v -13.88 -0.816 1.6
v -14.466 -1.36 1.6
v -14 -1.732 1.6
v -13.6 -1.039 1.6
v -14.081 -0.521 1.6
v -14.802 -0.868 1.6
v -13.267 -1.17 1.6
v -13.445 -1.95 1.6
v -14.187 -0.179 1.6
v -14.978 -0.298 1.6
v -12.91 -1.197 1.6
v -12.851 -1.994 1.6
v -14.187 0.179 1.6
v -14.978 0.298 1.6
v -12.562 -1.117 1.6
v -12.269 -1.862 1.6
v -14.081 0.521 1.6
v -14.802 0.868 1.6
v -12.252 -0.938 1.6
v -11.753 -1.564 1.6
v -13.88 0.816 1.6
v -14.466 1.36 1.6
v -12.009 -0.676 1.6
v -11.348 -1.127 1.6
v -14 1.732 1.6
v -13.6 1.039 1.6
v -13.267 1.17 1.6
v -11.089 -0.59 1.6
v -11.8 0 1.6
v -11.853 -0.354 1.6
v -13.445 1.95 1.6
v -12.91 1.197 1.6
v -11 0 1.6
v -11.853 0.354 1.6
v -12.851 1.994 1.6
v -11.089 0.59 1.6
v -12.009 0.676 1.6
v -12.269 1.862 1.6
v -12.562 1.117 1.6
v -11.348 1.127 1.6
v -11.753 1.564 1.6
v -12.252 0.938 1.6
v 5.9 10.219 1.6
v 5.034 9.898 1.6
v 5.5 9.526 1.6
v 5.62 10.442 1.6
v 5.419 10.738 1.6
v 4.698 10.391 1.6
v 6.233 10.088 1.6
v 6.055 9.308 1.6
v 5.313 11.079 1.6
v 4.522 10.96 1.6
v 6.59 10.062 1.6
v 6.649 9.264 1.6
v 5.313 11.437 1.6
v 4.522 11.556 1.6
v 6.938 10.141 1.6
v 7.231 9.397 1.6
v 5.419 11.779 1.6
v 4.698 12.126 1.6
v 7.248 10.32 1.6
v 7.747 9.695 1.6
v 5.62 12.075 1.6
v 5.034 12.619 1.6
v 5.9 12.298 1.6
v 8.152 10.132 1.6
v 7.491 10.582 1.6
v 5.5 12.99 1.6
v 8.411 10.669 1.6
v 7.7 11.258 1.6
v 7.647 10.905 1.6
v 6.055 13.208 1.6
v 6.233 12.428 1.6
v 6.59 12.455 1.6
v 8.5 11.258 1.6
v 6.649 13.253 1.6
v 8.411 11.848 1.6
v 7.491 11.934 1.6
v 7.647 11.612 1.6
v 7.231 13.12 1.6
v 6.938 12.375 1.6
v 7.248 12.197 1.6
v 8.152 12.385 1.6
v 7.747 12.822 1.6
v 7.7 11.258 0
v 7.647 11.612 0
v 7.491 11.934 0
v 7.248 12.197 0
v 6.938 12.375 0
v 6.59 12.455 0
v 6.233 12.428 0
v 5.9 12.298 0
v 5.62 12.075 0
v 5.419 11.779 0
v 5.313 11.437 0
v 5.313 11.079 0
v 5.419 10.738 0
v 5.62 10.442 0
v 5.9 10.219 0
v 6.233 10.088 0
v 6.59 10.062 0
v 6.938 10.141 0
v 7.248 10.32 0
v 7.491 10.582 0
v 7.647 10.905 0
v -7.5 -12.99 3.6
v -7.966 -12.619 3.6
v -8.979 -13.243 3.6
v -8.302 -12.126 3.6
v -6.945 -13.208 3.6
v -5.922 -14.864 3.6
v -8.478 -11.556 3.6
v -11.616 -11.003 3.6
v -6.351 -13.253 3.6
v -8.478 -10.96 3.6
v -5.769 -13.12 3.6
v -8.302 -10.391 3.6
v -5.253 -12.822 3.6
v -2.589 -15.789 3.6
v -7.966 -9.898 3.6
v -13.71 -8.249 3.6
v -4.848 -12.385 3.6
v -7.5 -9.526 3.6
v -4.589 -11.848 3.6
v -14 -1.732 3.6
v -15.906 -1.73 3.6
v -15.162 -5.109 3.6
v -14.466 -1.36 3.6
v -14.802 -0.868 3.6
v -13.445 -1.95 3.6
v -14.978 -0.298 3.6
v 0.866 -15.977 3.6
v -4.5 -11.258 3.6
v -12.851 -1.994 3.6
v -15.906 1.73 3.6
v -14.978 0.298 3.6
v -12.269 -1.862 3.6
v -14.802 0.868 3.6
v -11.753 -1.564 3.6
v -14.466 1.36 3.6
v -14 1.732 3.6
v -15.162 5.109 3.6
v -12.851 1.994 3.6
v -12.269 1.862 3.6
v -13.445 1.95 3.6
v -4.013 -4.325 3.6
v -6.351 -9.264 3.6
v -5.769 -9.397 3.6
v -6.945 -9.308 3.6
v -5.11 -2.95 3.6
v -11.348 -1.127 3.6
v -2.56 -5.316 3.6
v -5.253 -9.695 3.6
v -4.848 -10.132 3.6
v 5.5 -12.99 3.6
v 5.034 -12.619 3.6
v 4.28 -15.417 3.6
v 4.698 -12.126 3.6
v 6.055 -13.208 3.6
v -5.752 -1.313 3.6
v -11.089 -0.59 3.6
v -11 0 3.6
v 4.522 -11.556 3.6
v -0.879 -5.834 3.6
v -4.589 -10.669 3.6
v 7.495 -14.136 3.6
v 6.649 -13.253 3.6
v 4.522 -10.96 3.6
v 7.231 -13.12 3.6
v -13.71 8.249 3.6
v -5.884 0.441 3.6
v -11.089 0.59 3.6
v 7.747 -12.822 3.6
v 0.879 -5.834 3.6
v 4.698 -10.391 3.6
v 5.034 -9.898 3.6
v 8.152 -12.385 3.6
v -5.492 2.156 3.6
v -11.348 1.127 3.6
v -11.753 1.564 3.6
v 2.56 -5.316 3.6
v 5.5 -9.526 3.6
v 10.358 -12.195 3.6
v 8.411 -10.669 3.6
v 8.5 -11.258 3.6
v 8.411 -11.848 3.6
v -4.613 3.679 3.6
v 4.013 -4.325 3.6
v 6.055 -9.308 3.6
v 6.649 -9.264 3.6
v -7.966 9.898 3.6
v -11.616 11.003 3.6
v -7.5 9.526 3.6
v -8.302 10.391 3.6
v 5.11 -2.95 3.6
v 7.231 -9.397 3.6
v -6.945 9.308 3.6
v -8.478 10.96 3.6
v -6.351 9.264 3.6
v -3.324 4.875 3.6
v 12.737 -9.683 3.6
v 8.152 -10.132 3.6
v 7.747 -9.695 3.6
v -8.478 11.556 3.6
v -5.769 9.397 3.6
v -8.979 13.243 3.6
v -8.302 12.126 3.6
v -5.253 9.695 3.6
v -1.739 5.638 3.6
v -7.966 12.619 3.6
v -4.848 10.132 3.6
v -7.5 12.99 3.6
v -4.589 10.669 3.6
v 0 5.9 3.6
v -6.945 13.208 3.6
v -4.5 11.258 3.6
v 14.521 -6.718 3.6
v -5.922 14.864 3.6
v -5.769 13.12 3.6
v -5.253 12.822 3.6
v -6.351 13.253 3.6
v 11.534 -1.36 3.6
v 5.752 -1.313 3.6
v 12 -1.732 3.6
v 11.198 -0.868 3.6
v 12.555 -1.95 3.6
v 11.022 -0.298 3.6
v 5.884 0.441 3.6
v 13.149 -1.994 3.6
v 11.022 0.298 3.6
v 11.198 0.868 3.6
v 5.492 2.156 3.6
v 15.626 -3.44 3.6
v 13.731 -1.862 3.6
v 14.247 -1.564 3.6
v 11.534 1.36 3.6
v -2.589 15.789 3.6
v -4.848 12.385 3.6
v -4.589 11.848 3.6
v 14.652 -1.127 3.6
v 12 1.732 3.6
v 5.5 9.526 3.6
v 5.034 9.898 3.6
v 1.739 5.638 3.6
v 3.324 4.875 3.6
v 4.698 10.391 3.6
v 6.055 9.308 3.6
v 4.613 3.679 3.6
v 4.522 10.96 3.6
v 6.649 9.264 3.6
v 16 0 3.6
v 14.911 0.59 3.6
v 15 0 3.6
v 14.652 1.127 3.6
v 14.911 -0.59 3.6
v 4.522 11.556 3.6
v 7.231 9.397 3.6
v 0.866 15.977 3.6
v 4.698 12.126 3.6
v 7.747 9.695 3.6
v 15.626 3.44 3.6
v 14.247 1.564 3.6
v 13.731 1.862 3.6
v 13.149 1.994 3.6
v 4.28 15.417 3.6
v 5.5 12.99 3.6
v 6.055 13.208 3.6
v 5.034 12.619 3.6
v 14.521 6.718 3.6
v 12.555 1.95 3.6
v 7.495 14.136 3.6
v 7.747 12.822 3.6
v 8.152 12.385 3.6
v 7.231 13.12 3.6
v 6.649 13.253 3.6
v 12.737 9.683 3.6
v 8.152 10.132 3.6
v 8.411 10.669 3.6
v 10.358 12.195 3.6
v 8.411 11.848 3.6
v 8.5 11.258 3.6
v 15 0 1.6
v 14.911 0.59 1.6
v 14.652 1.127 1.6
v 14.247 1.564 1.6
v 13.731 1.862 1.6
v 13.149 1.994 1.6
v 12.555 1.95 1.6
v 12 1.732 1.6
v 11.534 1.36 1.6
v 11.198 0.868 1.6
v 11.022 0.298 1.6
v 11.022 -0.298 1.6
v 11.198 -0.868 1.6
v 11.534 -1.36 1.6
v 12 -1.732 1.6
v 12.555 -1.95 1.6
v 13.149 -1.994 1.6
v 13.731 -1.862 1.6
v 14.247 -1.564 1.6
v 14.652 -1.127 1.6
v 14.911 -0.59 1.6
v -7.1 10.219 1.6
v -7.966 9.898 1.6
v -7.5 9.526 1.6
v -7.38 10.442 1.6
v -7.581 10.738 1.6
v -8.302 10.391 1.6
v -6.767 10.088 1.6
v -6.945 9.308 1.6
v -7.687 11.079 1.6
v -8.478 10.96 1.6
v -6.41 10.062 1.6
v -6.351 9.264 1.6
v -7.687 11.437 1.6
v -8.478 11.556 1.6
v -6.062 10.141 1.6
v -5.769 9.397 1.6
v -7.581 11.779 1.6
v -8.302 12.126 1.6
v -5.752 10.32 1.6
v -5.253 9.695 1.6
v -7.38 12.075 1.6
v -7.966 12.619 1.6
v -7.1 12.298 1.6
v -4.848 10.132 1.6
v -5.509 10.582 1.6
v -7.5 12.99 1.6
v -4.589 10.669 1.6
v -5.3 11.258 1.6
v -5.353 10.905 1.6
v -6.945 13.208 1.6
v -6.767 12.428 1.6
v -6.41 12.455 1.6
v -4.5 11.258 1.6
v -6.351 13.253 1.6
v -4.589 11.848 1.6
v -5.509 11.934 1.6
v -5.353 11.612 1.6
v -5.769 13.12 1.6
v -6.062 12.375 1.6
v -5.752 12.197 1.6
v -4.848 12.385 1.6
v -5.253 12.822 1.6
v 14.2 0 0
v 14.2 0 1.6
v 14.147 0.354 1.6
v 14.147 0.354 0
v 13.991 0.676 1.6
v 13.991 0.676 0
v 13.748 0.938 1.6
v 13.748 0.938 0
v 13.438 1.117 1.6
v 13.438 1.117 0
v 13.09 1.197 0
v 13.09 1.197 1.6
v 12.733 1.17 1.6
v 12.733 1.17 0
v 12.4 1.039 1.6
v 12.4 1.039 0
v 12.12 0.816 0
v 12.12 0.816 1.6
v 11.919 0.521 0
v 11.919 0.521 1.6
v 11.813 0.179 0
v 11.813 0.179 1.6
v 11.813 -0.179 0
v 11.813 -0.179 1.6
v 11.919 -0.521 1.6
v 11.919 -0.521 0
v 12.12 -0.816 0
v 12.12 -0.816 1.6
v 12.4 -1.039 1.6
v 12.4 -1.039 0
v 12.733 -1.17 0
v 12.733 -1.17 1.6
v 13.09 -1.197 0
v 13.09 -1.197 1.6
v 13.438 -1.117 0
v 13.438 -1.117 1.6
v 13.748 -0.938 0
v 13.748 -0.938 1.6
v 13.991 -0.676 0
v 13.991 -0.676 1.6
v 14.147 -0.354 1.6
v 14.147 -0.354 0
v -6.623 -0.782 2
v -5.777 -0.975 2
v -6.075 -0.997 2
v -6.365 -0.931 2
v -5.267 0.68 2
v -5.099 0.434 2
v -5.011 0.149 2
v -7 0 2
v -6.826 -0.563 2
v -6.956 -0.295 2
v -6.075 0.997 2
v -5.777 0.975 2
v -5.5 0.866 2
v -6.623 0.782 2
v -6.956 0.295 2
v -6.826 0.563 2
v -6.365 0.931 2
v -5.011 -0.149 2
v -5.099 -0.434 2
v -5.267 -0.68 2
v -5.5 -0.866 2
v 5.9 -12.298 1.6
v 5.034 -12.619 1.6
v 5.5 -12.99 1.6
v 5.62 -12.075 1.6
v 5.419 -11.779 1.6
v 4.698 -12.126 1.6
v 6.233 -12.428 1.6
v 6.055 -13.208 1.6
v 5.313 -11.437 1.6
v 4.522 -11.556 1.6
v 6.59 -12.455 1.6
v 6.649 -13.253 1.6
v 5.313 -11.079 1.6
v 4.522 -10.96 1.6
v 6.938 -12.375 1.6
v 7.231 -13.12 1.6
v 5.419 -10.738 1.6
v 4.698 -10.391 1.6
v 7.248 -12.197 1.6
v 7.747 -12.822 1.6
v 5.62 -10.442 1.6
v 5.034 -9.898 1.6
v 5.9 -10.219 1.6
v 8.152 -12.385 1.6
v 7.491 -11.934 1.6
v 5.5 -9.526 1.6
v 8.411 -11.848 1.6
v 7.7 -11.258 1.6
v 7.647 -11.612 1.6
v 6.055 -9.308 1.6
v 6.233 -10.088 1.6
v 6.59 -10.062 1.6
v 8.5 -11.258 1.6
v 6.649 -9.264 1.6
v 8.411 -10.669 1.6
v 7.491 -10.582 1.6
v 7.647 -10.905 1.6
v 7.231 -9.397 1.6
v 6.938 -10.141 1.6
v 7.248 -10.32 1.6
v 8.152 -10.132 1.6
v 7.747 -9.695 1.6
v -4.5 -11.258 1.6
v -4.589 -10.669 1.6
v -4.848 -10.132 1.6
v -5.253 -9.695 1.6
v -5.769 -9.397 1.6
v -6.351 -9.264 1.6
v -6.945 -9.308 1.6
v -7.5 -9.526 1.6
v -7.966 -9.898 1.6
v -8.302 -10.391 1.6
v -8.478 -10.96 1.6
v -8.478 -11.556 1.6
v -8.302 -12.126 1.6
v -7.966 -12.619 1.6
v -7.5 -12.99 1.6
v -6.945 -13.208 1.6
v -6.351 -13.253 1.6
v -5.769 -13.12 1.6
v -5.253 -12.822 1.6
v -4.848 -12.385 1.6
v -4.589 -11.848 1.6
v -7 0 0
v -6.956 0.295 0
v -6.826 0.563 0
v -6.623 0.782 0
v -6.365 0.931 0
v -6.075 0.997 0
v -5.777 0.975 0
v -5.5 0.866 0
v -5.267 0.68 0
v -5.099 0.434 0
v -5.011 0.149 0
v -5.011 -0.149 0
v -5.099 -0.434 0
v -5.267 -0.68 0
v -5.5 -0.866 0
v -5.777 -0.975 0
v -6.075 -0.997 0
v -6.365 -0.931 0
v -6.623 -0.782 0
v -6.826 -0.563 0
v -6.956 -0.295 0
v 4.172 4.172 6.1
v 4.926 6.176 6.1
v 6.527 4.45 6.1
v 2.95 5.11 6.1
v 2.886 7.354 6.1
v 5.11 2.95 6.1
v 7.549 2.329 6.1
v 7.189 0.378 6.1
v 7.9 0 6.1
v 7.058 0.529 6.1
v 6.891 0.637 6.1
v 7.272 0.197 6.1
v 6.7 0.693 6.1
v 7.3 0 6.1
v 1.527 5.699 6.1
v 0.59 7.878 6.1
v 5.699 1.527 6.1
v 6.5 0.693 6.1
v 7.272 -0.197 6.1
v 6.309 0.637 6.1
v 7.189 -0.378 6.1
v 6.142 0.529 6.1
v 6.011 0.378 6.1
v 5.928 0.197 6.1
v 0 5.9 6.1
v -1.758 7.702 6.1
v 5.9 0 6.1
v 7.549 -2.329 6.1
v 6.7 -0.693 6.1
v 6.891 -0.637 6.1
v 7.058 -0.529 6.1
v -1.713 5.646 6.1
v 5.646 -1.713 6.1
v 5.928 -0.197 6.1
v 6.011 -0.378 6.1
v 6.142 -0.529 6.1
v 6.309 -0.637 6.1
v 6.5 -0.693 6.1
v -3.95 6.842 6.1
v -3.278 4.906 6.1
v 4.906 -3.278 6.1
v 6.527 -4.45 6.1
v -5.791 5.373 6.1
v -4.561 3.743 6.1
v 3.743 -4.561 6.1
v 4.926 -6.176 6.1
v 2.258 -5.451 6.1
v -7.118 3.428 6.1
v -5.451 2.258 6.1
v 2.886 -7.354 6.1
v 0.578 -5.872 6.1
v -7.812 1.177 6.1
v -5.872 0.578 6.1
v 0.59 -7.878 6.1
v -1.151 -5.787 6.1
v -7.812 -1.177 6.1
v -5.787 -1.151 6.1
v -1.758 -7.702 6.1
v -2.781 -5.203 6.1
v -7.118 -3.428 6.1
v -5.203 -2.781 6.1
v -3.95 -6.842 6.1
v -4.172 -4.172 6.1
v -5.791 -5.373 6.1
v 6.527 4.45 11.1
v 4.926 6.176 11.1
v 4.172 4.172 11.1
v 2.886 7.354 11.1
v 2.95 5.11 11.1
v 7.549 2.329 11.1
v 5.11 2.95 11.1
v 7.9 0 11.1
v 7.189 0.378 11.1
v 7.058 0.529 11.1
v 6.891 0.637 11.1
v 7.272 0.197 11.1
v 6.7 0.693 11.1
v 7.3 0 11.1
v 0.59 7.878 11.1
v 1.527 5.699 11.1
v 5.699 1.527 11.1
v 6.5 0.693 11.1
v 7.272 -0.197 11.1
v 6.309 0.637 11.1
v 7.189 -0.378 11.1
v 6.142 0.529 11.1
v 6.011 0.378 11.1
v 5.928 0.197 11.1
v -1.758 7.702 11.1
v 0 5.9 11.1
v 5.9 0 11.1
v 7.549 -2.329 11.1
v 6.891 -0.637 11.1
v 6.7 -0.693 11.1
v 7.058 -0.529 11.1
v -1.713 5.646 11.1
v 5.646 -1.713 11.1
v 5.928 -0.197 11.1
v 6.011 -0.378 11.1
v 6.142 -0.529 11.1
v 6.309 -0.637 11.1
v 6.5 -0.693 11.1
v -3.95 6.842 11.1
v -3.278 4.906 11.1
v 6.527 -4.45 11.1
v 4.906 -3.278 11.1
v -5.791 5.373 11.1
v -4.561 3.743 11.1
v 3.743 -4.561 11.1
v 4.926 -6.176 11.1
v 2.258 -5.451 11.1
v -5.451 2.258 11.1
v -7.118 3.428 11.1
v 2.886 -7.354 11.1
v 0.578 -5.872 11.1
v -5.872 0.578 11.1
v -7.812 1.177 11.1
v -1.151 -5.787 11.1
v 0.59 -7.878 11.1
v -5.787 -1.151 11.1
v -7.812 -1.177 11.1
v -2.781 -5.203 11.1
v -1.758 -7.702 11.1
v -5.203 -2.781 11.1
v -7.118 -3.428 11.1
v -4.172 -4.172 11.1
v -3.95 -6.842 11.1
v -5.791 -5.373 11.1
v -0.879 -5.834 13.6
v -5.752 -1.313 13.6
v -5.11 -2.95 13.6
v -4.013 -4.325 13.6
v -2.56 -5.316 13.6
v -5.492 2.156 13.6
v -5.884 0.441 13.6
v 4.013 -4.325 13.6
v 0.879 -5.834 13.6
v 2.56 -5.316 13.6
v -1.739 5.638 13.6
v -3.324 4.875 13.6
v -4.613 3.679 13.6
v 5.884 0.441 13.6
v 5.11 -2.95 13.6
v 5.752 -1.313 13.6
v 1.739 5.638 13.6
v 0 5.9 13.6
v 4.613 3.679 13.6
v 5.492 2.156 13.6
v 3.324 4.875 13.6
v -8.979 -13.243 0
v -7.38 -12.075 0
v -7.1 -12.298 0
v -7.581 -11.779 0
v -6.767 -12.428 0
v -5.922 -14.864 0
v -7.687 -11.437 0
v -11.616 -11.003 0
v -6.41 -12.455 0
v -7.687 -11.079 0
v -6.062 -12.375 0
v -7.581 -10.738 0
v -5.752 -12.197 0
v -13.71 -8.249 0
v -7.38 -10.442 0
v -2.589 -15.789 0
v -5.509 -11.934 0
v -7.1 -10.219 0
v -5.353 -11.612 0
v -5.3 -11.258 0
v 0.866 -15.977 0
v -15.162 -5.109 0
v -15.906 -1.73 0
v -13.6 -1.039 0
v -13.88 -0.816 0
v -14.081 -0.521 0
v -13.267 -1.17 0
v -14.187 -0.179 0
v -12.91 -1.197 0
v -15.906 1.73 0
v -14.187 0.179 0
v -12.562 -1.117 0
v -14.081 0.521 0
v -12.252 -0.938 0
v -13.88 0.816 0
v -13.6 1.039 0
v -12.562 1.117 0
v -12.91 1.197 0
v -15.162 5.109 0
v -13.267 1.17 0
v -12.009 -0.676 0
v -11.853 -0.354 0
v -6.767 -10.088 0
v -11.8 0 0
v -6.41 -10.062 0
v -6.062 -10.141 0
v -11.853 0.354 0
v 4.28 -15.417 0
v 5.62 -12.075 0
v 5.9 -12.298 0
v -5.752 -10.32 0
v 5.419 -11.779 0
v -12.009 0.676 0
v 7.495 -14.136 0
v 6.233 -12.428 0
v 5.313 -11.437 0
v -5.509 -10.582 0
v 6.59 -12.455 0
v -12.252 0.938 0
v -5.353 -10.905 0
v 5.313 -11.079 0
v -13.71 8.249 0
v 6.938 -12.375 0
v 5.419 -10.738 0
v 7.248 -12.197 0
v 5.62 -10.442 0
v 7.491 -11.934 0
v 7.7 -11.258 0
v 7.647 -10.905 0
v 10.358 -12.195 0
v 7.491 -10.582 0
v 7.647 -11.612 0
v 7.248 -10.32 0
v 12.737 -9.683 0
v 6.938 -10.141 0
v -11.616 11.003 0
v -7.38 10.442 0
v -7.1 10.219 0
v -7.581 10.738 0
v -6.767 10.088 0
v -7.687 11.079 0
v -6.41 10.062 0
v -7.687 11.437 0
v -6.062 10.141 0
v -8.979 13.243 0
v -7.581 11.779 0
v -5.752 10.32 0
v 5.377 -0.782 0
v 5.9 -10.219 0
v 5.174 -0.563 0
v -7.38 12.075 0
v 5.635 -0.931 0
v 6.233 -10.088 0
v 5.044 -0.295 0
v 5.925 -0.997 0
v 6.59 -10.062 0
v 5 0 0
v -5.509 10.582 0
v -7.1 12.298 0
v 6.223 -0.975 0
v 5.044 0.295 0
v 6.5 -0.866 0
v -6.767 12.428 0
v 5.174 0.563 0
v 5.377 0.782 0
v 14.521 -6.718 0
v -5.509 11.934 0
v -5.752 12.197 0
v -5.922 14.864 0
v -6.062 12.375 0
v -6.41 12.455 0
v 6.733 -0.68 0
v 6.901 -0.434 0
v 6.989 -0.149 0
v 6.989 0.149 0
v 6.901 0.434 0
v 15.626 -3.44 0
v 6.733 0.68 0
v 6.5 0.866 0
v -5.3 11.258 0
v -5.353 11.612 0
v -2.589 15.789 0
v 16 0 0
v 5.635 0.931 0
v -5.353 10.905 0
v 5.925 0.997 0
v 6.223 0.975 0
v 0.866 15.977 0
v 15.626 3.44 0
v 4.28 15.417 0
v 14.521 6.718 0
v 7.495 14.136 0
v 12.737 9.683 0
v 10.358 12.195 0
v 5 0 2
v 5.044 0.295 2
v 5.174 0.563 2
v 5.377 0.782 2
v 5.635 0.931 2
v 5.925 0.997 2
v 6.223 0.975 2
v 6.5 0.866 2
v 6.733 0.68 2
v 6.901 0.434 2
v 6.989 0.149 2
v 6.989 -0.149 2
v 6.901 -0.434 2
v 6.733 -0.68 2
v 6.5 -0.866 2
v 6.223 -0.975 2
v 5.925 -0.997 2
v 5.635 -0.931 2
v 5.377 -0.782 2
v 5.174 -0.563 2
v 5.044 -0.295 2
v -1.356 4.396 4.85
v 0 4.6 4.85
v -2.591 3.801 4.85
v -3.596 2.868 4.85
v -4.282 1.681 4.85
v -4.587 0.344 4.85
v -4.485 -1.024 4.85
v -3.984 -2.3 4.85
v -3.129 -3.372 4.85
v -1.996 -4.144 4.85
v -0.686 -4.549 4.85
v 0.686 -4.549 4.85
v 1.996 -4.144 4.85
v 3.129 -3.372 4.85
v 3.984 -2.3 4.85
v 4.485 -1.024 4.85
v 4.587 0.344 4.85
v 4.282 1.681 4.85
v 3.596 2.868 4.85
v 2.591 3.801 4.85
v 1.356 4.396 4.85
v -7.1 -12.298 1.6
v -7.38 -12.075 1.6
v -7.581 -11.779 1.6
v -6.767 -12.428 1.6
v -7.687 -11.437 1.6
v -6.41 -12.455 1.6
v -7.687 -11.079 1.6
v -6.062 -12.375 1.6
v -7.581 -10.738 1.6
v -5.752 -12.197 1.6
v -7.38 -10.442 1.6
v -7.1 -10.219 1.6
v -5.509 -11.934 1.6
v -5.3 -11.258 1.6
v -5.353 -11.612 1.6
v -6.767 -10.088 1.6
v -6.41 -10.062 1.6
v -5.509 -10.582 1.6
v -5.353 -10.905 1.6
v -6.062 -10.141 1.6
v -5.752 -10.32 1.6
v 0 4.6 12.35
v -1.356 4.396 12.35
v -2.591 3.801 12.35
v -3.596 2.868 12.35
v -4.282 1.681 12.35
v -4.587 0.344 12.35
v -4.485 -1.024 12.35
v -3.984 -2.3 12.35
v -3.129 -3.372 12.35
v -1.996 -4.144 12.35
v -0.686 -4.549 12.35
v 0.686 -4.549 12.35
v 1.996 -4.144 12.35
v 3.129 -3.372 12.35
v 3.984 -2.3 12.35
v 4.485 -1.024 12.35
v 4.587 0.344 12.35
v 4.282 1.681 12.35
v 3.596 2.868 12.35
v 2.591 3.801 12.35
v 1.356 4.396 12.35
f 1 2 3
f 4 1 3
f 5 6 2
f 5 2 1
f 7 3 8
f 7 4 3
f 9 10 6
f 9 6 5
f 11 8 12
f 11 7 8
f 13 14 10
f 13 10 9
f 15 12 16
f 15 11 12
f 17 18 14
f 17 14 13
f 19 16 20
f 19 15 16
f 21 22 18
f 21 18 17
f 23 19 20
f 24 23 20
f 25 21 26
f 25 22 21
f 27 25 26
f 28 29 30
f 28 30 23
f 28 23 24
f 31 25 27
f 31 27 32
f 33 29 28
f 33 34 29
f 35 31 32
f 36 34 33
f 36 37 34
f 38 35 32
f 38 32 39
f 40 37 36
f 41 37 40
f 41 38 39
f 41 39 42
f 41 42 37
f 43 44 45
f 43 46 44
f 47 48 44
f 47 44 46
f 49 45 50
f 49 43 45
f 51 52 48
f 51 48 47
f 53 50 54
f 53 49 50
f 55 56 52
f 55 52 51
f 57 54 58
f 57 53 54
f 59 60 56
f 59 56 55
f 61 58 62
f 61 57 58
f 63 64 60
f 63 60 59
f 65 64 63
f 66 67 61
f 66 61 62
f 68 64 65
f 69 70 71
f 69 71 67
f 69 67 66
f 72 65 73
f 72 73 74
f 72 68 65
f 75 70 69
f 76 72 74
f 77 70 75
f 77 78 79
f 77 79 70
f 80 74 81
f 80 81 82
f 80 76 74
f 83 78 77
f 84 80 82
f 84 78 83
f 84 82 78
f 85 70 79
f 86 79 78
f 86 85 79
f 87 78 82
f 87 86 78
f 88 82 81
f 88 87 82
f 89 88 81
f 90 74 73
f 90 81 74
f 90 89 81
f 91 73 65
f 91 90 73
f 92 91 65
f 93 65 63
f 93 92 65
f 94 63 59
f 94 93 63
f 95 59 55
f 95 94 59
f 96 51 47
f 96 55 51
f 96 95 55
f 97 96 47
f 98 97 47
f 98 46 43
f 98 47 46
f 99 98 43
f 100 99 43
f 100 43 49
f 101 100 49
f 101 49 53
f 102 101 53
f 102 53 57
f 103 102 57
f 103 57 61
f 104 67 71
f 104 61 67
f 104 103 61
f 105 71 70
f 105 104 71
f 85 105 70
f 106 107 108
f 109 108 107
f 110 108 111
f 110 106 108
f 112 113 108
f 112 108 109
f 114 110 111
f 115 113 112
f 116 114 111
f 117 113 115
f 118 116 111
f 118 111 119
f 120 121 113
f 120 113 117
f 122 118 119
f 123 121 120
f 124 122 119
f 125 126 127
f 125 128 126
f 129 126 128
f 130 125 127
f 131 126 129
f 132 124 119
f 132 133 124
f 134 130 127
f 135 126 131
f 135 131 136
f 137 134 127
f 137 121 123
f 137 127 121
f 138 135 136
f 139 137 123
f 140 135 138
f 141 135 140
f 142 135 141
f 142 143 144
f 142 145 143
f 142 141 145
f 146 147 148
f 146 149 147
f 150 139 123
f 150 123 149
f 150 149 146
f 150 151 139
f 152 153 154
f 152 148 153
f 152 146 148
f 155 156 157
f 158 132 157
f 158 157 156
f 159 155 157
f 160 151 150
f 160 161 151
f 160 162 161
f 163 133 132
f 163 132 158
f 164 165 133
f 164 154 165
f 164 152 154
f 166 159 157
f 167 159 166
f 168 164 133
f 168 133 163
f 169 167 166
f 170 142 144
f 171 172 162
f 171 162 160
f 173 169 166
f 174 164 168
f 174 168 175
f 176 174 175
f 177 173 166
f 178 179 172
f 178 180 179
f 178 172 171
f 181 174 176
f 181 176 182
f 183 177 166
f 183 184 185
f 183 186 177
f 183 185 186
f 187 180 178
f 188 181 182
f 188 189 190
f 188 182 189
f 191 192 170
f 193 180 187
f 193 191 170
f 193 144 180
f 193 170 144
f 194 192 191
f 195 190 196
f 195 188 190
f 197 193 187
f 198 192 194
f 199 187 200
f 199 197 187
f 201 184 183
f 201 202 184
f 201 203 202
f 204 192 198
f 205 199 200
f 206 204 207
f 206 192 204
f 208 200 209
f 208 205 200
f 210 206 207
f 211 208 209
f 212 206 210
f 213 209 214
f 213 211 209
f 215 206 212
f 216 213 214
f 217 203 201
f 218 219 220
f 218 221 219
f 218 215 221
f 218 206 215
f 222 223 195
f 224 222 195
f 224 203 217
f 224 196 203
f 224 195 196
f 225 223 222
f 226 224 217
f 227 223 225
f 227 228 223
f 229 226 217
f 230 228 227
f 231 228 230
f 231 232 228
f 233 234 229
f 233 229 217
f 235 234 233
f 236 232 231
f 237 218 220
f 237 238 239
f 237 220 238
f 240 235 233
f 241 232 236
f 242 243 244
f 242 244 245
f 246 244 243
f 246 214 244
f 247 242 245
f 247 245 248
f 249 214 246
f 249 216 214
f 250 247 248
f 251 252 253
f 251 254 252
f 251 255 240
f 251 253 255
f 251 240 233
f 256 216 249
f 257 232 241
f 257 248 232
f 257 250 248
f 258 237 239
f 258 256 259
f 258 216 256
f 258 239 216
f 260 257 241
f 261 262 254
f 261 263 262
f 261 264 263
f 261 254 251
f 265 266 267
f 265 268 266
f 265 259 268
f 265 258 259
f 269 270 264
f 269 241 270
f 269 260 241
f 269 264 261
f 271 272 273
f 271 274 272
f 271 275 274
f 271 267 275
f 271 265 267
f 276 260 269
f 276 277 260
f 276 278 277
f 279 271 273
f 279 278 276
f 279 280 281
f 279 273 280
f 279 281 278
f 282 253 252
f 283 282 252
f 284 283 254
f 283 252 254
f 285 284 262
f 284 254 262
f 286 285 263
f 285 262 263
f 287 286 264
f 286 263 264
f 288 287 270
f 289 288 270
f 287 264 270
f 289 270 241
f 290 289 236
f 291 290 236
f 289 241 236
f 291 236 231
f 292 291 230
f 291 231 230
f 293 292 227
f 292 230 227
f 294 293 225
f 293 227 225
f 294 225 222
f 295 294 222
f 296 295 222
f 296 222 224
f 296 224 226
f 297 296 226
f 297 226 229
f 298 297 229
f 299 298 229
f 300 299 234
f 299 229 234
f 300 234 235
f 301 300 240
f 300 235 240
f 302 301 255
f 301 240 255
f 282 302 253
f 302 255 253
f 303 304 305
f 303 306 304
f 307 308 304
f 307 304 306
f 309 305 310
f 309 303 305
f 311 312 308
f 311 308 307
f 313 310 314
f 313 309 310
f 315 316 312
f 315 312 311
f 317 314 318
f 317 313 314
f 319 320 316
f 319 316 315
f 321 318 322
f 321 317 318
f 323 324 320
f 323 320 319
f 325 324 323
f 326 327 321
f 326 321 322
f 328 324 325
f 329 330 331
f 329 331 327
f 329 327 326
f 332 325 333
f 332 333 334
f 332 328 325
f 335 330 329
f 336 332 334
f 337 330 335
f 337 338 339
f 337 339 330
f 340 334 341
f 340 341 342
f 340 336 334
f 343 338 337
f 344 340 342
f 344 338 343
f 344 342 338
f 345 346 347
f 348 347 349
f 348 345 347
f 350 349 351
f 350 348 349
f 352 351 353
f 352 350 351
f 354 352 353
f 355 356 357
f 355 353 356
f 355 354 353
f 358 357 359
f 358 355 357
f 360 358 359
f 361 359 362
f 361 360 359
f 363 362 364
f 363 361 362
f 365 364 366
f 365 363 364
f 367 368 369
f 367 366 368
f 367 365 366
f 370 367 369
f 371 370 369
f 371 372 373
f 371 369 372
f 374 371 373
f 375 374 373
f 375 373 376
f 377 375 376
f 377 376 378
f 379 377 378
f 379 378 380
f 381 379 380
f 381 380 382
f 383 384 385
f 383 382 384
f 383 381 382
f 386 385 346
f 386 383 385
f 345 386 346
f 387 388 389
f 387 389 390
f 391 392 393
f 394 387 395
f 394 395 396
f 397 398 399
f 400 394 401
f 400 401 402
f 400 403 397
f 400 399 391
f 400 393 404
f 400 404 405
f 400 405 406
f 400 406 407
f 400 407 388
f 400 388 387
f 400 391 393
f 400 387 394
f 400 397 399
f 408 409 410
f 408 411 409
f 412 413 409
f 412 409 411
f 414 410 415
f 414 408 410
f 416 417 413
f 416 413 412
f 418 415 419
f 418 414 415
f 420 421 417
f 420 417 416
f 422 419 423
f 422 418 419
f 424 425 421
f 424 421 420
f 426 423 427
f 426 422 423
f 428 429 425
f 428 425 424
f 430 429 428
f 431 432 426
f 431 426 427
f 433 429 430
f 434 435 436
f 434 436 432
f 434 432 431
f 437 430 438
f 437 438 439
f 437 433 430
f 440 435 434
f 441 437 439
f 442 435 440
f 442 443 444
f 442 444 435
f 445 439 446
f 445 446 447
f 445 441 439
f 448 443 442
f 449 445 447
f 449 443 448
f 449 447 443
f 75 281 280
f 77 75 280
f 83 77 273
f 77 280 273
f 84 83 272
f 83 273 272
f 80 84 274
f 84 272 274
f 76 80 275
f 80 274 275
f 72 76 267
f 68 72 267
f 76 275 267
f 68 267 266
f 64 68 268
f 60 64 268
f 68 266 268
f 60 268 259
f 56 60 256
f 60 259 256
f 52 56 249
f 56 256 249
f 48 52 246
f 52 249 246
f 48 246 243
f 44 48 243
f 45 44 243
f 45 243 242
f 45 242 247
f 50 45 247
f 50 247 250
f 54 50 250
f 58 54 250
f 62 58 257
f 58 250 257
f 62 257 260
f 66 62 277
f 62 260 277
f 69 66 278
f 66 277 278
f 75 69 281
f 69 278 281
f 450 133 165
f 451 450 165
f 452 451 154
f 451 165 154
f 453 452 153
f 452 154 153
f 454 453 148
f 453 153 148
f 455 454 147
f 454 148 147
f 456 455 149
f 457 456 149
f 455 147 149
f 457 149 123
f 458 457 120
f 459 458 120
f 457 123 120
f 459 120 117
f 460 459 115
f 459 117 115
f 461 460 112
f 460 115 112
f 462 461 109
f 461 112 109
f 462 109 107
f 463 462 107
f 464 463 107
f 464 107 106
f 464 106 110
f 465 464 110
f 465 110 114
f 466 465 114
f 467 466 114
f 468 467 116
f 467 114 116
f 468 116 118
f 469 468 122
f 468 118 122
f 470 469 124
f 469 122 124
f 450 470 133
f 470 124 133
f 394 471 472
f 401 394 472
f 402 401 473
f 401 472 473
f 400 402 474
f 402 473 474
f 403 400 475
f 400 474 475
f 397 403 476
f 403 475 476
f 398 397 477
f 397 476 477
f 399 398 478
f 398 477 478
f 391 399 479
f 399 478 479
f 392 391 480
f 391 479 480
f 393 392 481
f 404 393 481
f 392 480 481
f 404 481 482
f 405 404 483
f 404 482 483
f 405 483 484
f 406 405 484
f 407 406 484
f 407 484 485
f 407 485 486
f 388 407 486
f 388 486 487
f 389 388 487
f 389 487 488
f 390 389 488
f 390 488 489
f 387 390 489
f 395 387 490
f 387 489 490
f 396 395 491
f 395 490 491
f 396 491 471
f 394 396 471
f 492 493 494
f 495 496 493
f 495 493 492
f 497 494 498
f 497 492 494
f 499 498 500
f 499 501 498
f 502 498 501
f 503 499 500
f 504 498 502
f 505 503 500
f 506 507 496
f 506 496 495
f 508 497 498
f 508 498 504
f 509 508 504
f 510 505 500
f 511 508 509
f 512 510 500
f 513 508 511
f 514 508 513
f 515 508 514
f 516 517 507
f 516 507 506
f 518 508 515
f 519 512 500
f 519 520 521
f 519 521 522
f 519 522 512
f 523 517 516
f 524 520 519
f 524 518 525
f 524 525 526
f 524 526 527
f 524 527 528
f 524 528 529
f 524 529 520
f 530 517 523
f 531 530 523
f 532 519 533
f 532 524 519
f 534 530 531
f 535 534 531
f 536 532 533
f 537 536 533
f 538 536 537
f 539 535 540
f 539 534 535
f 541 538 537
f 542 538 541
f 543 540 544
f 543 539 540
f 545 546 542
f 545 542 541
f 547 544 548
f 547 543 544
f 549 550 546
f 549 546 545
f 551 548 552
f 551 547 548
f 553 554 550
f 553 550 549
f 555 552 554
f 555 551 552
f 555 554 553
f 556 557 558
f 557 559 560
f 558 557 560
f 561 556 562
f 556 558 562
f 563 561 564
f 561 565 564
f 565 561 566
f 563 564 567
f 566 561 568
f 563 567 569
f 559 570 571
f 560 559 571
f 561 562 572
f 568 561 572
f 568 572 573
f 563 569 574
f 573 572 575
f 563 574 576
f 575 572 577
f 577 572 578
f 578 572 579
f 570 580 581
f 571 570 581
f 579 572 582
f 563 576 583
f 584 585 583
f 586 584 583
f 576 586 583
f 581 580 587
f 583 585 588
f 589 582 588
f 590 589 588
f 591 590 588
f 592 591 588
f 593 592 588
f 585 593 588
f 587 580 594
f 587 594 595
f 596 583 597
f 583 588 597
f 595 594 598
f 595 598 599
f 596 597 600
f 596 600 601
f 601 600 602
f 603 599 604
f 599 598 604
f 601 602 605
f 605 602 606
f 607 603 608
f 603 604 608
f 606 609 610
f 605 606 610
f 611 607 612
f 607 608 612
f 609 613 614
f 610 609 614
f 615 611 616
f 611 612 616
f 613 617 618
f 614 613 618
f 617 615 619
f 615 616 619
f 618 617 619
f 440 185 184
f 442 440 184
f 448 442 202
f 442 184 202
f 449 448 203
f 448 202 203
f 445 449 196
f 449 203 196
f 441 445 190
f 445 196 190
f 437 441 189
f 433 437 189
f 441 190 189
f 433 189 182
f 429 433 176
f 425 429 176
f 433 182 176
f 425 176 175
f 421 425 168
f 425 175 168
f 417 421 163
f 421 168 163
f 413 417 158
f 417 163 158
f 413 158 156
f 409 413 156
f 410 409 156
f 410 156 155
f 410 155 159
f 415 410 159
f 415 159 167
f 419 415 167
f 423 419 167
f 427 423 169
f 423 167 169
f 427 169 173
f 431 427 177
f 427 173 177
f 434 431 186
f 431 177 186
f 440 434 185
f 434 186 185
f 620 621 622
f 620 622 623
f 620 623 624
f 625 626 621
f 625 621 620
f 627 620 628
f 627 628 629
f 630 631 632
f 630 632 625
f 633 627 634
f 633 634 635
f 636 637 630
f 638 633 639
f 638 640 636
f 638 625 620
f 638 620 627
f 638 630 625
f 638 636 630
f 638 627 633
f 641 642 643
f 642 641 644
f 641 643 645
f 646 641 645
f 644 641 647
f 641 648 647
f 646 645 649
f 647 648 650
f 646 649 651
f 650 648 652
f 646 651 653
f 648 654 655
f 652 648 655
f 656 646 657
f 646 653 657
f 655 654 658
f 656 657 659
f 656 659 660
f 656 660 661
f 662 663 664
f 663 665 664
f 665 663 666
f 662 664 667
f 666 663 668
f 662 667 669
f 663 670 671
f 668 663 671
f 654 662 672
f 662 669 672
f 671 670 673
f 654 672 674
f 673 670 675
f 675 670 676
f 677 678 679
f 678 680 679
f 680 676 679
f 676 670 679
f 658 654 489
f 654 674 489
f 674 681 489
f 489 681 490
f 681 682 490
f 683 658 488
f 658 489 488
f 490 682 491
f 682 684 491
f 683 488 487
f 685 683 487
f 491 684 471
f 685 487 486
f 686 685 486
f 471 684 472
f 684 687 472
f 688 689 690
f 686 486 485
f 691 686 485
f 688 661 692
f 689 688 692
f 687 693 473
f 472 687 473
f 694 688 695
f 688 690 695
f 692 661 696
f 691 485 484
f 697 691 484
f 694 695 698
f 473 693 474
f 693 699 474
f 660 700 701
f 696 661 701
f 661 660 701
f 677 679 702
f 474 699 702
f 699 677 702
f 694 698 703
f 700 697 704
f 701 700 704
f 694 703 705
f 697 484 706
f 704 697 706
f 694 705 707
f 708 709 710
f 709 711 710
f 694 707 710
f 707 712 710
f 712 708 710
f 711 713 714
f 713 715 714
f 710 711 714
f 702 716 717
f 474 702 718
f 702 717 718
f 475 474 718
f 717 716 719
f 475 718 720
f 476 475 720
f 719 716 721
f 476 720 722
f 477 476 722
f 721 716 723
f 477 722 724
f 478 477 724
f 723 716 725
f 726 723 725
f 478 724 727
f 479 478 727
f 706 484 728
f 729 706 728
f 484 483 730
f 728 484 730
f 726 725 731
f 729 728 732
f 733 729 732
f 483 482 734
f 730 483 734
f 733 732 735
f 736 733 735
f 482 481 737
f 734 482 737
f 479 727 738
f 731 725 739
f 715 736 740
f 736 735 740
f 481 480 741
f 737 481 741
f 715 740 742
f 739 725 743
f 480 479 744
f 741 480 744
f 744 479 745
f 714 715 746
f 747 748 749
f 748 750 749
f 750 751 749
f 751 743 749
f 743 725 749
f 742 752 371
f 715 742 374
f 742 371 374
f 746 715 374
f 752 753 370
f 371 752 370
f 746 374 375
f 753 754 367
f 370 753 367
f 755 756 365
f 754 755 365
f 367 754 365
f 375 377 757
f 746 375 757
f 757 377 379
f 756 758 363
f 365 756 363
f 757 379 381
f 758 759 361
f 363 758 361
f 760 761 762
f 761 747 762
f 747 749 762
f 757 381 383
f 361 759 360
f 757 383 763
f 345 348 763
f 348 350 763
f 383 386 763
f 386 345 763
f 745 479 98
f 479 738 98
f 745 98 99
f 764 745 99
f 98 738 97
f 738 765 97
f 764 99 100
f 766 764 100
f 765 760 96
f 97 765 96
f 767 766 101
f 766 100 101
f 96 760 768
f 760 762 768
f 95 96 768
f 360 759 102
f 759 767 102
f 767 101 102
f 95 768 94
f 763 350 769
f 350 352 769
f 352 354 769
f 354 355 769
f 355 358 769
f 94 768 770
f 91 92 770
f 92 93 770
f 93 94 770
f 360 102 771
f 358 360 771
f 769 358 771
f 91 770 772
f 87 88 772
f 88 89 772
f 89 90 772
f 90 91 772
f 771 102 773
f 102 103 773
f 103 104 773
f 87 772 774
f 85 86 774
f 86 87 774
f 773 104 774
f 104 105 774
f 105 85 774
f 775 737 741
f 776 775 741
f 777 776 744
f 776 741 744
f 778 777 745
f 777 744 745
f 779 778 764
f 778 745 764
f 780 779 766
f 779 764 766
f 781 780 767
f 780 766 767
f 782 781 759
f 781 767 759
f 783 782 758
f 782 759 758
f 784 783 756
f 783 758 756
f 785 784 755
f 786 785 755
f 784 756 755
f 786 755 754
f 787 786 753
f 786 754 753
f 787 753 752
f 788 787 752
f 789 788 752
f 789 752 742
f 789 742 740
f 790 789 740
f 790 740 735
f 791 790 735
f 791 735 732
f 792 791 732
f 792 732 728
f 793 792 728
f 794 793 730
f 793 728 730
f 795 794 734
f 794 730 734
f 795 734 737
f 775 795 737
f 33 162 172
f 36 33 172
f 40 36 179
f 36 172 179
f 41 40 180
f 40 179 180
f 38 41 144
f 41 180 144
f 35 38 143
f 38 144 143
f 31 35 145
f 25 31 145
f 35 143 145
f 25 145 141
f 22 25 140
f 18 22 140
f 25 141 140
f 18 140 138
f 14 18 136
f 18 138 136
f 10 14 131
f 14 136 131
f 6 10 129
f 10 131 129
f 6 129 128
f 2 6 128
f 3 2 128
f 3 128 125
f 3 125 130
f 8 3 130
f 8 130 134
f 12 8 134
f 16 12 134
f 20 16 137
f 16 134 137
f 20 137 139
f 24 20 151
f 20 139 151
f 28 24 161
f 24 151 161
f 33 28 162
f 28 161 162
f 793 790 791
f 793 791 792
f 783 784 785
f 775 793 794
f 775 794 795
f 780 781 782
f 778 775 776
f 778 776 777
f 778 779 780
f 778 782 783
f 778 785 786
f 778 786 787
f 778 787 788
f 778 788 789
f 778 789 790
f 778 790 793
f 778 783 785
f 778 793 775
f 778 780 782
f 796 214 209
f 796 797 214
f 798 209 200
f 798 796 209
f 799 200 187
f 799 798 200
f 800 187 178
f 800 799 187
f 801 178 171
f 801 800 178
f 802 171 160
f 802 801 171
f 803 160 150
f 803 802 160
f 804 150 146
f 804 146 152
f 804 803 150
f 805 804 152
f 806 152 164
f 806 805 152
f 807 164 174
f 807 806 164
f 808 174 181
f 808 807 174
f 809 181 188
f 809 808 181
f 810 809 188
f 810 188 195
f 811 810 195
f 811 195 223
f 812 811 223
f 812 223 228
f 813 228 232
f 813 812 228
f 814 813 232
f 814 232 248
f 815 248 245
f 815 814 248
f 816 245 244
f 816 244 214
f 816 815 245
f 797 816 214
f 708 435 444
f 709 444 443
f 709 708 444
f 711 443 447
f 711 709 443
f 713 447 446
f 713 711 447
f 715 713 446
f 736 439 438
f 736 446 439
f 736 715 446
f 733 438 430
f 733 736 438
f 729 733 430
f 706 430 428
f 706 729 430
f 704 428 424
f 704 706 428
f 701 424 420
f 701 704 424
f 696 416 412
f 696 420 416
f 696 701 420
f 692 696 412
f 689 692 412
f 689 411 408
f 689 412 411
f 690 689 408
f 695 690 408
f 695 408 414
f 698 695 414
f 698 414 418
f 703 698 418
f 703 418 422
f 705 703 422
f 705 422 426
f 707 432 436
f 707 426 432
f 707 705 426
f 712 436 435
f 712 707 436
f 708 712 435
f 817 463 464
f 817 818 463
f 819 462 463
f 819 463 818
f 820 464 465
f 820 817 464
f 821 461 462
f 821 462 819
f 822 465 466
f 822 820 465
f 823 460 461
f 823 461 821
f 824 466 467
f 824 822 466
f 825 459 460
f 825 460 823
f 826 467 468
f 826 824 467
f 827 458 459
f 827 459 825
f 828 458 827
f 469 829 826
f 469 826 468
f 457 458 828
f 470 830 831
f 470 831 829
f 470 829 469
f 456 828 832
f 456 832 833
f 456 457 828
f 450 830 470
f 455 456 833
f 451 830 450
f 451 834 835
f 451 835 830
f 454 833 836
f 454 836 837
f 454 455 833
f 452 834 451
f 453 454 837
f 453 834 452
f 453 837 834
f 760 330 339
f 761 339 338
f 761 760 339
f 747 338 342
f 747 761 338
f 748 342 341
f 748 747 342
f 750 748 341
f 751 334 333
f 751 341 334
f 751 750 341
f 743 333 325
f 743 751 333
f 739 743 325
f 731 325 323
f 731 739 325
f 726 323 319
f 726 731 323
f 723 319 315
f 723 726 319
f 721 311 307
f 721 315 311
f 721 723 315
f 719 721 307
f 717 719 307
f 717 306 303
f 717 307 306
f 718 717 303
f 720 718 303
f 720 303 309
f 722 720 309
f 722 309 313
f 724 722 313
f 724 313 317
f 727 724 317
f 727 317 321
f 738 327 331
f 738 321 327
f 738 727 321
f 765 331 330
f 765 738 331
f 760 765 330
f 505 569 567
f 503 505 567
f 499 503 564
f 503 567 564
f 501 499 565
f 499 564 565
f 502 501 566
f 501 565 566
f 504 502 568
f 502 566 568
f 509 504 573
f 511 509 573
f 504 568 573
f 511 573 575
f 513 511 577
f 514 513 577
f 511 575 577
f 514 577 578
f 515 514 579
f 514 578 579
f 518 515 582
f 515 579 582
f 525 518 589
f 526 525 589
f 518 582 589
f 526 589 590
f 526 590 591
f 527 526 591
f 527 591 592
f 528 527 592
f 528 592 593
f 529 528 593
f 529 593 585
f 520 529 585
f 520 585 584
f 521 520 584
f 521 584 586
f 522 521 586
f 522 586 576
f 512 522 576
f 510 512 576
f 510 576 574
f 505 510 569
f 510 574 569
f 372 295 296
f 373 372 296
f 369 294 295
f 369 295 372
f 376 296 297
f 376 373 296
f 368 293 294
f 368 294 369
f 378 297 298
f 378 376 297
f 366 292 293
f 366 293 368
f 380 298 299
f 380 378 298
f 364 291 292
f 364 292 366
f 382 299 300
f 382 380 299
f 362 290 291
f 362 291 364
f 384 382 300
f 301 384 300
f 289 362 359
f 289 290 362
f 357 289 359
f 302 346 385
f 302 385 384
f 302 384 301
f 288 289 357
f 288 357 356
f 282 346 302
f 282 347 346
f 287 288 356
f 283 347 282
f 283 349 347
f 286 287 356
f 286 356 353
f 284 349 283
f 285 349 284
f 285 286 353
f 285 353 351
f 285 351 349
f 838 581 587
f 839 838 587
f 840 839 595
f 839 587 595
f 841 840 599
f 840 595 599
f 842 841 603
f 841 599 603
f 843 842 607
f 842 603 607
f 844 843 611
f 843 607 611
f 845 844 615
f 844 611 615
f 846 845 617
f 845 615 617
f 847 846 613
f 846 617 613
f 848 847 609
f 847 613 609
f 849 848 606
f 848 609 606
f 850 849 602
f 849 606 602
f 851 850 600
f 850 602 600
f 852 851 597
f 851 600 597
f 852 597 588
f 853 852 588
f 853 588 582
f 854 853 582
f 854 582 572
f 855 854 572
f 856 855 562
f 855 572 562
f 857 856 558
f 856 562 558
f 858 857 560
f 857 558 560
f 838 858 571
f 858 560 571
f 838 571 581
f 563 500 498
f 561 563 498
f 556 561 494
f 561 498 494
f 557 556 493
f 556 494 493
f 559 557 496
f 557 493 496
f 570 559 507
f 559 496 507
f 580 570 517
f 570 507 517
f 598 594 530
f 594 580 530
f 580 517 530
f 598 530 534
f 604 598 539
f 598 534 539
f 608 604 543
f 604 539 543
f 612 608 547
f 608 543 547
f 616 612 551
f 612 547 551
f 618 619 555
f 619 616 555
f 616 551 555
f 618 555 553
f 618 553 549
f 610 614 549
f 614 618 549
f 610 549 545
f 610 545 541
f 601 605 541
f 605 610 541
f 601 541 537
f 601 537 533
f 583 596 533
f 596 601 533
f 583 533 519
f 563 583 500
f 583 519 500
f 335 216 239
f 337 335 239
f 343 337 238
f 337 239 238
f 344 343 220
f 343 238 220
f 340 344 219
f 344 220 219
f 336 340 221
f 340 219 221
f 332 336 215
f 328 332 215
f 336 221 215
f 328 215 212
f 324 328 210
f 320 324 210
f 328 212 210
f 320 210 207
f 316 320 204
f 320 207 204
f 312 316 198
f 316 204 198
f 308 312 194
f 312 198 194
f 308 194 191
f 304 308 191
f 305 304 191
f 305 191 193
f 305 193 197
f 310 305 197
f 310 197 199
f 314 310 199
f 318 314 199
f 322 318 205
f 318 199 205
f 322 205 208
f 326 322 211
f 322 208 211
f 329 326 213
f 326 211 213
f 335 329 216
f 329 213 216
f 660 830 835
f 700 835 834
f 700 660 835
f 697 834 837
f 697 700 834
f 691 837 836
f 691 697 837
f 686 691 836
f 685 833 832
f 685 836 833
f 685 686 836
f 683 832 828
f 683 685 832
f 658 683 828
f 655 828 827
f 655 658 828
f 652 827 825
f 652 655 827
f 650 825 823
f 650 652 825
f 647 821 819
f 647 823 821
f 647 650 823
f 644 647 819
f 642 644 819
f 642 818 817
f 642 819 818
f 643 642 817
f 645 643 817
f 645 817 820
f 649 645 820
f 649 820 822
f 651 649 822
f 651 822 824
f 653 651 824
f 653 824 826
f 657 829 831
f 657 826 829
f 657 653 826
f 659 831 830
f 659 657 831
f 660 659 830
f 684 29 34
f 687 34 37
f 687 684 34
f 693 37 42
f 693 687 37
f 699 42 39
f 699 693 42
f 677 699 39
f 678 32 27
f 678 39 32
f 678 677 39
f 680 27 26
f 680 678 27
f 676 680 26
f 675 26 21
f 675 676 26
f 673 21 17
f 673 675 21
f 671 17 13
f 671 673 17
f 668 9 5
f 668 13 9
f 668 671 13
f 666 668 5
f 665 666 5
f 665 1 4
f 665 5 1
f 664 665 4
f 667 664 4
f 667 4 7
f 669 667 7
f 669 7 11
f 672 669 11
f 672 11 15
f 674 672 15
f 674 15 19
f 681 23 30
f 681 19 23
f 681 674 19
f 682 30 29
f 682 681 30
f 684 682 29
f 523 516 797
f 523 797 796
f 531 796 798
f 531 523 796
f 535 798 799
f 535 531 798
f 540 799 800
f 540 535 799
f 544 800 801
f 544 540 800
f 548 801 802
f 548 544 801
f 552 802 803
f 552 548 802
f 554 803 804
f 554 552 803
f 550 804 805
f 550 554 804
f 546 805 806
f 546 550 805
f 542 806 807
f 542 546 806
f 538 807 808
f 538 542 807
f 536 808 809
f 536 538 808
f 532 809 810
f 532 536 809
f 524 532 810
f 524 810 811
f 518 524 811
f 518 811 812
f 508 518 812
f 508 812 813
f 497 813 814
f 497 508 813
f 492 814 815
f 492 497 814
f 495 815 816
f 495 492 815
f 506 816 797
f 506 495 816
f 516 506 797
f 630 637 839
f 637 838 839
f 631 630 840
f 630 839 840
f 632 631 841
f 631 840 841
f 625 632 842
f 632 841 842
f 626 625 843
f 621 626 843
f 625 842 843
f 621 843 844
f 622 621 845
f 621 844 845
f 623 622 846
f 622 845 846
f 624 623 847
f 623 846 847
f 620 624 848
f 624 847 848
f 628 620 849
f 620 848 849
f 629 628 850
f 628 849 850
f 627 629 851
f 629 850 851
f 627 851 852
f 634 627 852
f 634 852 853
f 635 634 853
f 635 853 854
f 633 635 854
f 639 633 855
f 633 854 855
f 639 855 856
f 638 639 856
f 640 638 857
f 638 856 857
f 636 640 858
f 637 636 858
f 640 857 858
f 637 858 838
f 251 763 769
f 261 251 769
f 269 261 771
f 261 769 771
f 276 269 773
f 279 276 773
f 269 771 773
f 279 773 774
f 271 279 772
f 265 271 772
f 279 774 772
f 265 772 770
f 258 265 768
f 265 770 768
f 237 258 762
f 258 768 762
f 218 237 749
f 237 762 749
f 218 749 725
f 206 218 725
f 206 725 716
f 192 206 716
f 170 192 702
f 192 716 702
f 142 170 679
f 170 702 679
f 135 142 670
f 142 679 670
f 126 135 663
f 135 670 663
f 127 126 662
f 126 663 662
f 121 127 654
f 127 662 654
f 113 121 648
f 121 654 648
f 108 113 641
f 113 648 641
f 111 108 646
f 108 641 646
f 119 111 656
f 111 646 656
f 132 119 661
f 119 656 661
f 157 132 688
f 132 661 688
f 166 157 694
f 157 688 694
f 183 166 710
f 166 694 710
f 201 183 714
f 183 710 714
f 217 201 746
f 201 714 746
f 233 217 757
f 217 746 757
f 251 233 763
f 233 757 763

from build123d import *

# Parameters (mm, degrees)
SKETCH_1_R          = 16
SKETCH_1_R_2        = 1.2
EXTRUDE_1_DEPTH     = 3.6
SKETCH_2_R          = 2
CUT_EXTRUDE_1_DEPTH = 2
SKETCH_3_R          = 1
CUT_EXTRUDE_2_DEPTH = 2
SKETCH_4_R          = 7.9
EXTRUDE_2_DEPTH     = 10
SKETCH_6_R          = 0.7
CUT_EXTRUDE_3_DEPTH = 5


with BuildPart() as part:
    # 스케치1 → 보스-돌출1 (new body)
    with BuildSketch(Plane.XY):
        Circle(SKETCH_1_R)
        with Locations((13, 0)):
            Circle(SKETCH_1_R_2, mode=Mode.SUBTRACT)
        with Locations((6.5, -11.258330249)):
            Circle(SKETCH_1_R_2, mode=Mode.SUBTRACT)
        with Locations((-6.5, -11.258330249)):
            Circle(SKETCH_1_R_2, mode=Mode.SUBTRACT)
        with Locations((-13, 0)):
            Circle(SKETCH_1_R_2, mode=Mode.SUBTRACT)
        with Locations((-6.5, 11.258330249)):
            Circle(SKETCH_1_R_2, mode=Mode.SUBTRACT)
        with Locations((6.5, 11.258330249)):
            Circle(SKETCH_1_R_2, mode=Mode.SUBTRACT)
    extrude(amount=EXTRUDE_1_DEPTH)

    # 스케치2 → 컷-돌출1 (cut)
    with BuildSketch(Plane.XY.offset(3.6)):
        with Locations((13, 0)):
            Circle(SKETCH_2_R)
        with Locations((6.5, -11.258330249)):
            Circle(SKETCH_2_R)
        with Locations((-6.5, -11.258330249)):
            Circle(SKETCH_2_R)
        with Locations((-13, 0)):
            Circle(SKETCH_2_R)
        with Locations((-6.5, 11.258330249)):
            Circle(SKETCH_2_R)
        with Locations((6.5, 11.258330249)):
            Circle(SKETCH_2_R)
    extrude(amount=-CUT_EXTRUDE_1_DEPTH, mode=Mode.SUBTRACT)

    # 스케치3 → 컷-돌출2 (cut)
    with BuildSketch(Plane(origin=(0, 0, 0), x_dir=(-1, 0, 0), z_dir=(0, 0, -1))):
        with Locations((-6, 0)):
            Circle(SKETCH_3_R)
        with Locations((6, 0)):
            Circle(SKETCH_3_R)
    extrude(amount=-CUT_EXTRUDE_2_DEPTH, mode=Mode.SUBTRACT)

    # 스케치4 → 보스-돌출2 (add)
    with BuildSketch(Plane.XY.offset(3.6)):
        Circle(SKETCH_4_R)
    extrude(amount=EXTRUDE_2_DEPTH)

    # 스케치5 → 컷-회전1 (revolve, cut)
    with BuildSketch(Plane(origin=(0, 0, 0), x_dir=(0, 0, -1), z_dir=(1, 0, 0))):
        Polygon((-13.6, 7.9), (-13.6, 5.9), (-12.35, 4.6), (-11.1, 5.9), (-11.1, 7.9), align=None)
        Polygon((-6.1, 7.9), (-3.6, 7.9), (-3.6, 5.9), (-4.85, 4.6), (-6.1, 5.9), align=None)
    revolve(axis=Axis((0, 0, 0), (0, 0, 1)), mode=Mode.SUBTRACT)

    # 스케치6 → 컷-돌출3 (cut)
    with BuildSketch(Plane.XY.offset(11.1)):
        with Locations((6.6, 0)):
            Circle(SKETCH_6_R)
    extrude(amount=-CUT_EXTRUDE_3_DEPTH, mode=Mode.SUBTRACT)


solid = part.part
